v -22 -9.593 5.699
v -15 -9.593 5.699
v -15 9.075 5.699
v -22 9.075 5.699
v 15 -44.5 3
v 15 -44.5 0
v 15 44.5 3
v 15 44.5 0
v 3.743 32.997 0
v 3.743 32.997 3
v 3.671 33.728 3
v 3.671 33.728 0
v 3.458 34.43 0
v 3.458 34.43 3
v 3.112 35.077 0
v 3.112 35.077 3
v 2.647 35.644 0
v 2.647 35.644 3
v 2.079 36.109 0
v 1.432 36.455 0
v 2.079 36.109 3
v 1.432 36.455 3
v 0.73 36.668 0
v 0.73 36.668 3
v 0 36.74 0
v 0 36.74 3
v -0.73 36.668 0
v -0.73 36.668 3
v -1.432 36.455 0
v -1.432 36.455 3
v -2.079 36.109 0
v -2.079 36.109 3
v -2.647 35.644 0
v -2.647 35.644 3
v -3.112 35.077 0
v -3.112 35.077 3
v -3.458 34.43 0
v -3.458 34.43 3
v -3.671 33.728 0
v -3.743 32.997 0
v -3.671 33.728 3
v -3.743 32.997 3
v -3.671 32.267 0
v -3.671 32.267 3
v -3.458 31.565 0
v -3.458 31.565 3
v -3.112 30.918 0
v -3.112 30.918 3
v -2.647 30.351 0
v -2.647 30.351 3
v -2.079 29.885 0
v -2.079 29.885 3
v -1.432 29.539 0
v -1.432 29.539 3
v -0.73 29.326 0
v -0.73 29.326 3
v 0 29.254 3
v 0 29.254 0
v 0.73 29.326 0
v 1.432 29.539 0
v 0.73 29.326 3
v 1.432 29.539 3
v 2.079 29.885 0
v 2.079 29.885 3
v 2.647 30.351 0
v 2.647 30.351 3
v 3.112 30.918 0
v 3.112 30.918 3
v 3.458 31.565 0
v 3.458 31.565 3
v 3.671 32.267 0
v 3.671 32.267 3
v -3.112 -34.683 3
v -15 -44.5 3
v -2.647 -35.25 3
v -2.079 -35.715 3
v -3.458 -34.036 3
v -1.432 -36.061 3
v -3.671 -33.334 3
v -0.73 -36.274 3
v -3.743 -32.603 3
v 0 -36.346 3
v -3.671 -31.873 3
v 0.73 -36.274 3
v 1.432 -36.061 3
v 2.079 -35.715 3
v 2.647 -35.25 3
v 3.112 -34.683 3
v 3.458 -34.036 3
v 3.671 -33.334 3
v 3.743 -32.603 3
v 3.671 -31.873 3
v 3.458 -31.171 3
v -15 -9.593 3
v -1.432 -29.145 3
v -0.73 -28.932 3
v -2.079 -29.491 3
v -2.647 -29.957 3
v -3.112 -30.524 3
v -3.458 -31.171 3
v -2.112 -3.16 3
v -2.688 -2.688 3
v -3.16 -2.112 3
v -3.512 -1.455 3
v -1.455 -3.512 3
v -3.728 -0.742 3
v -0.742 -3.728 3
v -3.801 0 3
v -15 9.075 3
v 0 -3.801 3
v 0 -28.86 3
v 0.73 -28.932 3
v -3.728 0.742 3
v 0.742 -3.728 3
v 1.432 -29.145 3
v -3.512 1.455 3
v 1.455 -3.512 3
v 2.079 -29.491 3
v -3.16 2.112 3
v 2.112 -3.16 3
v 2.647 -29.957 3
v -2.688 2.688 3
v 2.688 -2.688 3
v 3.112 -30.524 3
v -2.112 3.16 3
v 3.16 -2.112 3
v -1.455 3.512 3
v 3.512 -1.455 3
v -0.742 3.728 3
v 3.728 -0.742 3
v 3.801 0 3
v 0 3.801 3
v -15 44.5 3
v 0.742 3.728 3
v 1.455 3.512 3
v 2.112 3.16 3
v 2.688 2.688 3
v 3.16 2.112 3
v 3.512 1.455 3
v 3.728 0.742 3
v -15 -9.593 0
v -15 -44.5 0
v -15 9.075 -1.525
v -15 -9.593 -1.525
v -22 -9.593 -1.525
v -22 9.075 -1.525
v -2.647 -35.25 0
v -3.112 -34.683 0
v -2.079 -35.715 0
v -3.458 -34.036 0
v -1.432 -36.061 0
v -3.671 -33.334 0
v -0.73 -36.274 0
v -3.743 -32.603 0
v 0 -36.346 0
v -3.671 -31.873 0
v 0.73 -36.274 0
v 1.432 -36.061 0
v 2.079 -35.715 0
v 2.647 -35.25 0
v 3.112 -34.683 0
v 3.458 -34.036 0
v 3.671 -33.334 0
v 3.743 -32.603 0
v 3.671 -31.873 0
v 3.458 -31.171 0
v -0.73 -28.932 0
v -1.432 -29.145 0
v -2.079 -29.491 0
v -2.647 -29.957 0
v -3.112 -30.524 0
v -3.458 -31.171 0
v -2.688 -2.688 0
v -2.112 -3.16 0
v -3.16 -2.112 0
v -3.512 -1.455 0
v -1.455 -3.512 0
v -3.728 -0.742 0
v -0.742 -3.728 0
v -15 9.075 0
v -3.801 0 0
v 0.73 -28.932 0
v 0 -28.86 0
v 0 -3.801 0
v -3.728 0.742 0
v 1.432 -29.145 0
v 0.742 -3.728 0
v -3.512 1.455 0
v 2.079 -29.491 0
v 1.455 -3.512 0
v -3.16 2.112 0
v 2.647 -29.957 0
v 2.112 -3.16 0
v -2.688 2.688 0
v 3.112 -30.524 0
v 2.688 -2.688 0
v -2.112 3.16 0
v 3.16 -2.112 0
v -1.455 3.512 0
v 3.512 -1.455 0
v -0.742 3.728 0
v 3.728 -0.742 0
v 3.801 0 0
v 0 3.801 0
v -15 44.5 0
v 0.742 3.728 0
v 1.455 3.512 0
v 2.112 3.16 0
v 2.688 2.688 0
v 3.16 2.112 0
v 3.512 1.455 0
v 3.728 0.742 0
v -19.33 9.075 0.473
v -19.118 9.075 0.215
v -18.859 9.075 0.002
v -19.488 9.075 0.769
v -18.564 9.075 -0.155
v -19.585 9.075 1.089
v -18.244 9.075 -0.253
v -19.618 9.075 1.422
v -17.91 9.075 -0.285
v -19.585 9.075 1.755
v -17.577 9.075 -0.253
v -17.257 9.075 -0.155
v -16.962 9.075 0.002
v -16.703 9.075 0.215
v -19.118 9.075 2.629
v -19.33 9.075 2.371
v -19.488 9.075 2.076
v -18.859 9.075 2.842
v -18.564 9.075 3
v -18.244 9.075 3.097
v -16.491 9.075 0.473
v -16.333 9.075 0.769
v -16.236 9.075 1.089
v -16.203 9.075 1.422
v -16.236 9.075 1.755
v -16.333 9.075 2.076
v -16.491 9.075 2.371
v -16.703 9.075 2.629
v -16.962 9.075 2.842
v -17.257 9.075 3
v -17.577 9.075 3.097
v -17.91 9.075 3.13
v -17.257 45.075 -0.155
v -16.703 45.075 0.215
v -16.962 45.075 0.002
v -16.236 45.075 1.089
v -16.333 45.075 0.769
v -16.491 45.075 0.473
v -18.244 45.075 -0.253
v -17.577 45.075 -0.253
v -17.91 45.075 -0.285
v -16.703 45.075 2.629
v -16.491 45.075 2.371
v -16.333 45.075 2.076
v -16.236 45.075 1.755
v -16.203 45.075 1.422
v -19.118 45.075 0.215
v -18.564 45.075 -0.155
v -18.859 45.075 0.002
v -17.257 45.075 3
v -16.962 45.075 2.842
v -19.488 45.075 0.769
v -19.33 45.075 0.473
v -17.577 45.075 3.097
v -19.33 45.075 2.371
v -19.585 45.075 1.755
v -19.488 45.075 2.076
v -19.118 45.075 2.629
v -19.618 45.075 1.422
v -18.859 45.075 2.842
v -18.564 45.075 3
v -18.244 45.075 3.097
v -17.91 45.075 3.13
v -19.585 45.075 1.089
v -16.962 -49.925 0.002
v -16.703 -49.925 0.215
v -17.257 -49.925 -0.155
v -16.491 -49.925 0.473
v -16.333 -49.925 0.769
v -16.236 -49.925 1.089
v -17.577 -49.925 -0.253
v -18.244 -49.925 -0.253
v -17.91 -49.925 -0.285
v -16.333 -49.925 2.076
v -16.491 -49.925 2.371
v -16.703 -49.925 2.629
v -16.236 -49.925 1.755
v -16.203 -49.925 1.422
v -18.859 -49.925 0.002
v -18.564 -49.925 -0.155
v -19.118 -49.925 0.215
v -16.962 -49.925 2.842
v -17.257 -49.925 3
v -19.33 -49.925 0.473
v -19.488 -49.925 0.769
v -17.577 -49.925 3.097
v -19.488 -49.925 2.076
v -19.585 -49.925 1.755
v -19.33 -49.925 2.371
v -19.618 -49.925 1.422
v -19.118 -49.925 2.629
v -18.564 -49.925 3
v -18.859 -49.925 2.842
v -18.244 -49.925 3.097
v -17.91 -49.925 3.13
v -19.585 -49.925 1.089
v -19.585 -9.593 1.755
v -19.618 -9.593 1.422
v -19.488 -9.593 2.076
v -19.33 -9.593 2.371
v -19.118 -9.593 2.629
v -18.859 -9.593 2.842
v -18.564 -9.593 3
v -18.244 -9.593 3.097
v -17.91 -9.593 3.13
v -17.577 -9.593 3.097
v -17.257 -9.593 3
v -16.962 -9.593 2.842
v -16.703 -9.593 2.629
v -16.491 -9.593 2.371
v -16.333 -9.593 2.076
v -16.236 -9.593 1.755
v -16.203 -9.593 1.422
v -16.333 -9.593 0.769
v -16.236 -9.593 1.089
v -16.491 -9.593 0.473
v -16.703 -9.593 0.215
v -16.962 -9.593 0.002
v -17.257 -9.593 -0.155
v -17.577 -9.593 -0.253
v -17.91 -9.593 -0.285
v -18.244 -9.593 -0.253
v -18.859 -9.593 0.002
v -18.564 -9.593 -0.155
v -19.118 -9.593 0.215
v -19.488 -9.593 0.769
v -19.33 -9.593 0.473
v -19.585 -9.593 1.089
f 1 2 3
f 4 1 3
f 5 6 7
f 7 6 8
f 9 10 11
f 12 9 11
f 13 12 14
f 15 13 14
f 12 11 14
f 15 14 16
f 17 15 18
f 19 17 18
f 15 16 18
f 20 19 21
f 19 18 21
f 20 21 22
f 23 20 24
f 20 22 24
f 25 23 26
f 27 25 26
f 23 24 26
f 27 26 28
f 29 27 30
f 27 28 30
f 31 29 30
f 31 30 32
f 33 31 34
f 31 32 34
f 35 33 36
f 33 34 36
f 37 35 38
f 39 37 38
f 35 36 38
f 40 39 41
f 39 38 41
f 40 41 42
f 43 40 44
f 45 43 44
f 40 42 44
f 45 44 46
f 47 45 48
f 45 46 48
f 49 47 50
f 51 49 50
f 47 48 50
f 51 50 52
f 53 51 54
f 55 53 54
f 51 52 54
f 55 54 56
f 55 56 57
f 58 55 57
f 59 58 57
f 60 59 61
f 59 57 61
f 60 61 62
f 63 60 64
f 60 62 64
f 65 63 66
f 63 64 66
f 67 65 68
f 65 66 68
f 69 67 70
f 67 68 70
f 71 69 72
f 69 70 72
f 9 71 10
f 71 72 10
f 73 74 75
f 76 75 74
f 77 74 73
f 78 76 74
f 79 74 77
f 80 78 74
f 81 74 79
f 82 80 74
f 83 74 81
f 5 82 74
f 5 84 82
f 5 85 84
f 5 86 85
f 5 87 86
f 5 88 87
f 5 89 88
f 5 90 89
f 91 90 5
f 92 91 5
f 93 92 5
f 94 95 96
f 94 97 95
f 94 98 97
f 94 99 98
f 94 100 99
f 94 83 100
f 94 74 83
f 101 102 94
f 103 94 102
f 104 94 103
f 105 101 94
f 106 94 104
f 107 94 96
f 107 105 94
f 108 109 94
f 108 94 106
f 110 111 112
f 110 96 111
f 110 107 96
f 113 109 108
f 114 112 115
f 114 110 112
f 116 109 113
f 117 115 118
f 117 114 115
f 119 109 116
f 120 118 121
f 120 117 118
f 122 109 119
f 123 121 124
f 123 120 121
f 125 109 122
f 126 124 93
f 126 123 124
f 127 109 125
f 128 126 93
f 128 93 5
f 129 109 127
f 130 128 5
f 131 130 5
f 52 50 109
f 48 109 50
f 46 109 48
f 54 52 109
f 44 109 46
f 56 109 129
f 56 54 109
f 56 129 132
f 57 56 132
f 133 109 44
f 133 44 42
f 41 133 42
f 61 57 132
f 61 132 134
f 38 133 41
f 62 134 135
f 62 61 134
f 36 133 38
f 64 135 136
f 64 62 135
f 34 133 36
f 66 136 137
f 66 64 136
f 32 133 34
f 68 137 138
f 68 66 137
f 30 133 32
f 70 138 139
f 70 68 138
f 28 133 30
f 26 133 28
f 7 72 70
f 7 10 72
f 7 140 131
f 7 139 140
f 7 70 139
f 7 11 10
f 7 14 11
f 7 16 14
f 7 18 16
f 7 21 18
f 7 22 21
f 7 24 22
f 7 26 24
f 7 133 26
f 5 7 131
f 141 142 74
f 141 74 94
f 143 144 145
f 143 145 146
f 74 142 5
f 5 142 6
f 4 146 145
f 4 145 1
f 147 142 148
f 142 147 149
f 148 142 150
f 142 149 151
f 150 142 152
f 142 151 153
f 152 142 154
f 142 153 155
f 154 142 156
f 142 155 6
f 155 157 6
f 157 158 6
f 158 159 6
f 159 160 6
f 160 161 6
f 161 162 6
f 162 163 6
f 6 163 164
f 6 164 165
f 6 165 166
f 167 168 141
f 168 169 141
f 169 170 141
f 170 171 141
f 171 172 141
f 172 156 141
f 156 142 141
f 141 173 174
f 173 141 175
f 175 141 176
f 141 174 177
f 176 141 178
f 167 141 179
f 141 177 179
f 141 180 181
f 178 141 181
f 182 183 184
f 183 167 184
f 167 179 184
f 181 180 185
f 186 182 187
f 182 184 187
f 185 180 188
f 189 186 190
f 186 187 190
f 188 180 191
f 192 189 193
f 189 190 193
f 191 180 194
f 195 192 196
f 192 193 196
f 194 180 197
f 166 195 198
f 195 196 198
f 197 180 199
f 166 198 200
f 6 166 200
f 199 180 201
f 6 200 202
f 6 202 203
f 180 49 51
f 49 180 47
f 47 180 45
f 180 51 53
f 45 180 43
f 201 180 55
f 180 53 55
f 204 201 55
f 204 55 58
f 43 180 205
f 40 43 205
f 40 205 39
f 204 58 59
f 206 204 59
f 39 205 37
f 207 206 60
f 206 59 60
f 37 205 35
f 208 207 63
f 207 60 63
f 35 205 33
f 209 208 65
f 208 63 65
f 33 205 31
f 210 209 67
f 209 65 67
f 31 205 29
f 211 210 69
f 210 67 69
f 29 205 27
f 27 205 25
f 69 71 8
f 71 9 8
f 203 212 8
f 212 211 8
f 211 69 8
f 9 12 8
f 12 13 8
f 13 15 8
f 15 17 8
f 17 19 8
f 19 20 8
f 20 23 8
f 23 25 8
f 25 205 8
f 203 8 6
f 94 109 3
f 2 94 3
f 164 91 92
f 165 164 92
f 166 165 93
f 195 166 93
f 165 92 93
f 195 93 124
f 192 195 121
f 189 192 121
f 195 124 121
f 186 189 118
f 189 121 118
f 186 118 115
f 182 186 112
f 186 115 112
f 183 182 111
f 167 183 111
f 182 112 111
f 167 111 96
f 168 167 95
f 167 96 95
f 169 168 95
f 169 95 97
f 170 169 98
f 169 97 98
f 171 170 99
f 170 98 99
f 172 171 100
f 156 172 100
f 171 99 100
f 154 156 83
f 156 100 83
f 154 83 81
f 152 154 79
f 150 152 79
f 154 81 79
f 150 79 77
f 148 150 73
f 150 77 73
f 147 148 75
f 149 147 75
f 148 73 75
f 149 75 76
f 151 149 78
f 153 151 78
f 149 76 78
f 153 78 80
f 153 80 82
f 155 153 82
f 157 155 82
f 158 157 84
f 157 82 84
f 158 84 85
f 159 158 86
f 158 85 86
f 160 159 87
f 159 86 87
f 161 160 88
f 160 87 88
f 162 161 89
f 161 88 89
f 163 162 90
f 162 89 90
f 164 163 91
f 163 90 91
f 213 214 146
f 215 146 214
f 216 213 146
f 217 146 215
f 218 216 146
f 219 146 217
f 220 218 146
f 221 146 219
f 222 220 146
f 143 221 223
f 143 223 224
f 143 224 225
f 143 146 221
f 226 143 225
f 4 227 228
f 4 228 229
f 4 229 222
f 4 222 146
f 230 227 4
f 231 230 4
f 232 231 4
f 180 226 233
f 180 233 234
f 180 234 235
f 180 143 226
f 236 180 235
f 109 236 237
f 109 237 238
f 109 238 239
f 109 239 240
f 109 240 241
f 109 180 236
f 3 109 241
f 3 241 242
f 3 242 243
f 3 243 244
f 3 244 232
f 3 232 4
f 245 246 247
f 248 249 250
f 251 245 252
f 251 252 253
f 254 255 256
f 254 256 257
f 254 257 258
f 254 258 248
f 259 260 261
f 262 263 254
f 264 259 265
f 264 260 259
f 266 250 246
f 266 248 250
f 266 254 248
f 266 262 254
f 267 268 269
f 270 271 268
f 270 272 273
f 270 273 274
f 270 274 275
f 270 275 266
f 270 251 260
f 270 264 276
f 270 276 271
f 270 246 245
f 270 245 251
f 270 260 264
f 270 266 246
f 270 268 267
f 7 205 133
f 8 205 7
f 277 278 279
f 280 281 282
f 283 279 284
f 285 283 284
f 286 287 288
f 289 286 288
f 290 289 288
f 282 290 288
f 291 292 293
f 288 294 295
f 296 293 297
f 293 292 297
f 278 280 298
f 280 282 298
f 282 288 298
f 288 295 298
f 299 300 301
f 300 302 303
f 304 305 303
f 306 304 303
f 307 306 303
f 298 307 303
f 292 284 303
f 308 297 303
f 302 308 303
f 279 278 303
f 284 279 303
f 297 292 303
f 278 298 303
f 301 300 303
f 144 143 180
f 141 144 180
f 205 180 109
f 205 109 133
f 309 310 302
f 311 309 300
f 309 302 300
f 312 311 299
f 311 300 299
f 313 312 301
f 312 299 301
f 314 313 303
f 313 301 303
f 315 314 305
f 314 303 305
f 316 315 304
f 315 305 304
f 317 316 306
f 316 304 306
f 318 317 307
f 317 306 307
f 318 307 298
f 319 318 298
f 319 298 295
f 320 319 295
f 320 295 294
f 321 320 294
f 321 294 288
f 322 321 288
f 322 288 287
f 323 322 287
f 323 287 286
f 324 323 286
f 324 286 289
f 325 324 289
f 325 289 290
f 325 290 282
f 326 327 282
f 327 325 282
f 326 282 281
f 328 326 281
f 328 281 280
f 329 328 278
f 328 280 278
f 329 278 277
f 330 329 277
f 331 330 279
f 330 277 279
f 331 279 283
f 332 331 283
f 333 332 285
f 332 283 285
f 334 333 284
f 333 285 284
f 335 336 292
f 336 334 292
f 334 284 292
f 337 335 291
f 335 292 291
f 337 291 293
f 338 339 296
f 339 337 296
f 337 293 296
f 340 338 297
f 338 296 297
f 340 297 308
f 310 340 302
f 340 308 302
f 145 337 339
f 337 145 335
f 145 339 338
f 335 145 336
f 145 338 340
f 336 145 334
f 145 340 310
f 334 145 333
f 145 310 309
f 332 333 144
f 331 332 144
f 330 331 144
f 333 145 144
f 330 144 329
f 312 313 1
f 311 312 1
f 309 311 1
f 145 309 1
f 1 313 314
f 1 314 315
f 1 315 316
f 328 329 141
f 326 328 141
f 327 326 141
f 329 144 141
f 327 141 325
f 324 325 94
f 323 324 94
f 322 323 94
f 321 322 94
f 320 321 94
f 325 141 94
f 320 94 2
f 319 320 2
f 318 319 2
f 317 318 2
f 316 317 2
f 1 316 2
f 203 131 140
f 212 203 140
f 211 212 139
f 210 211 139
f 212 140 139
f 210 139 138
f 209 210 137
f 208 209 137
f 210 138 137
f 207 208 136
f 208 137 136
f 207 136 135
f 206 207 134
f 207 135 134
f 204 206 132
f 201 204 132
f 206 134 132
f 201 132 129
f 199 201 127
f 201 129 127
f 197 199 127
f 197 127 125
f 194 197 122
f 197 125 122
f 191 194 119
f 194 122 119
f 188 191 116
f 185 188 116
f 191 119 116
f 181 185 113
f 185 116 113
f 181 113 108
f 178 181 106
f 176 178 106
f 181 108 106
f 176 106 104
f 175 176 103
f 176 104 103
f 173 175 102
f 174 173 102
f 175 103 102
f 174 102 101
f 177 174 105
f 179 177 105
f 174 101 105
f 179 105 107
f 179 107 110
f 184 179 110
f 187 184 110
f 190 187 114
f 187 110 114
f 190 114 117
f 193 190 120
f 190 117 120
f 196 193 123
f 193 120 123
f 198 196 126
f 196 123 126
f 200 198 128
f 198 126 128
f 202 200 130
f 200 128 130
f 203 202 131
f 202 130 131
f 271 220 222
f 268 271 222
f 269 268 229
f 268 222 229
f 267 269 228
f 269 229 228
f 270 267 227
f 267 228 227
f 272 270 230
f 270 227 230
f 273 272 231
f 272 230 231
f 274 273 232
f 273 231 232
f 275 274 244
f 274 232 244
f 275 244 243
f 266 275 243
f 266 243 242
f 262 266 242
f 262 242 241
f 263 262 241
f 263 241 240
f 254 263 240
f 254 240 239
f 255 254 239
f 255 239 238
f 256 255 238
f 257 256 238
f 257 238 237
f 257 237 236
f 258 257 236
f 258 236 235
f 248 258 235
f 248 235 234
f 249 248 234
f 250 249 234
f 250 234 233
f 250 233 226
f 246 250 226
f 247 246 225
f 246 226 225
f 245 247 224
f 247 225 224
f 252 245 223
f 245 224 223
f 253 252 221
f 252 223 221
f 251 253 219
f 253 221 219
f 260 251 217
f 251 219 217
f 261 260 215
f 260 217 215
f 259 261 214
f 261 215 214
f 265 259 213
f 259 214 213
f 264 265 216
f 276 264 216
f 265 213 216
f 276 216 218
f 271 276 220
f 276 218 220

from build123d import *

# Parameters (mm, degrees)
CROQUIS1_W                   = 30
CROQUIS1_H                   = 89
SALIENTE_EXTRUIR1_DEPTH      = 3
CROQUIS2_R                   = 3.800850318
CROQUIS2_R_2                 = 3.742975761
CORTAR_EXTRUIR1_DEPTH        = 3
CROQUIS3_W                   = 7.223510215
CROQUIS3_H                   = 18.667669577
SALIENTE_EXTRUIR2_DEPTH      = 7
SALIENTE_EXTRUIR3_DEPTH      = 36
SALIENTE_EXTRUIR3_DEPTH_BACK = 59
CROQUIS4_R                   = 1.707521399


with BuildPart() as part:
    # Croquis1 → Saliente-Extruir1 (new body)
    with BuildSketch(Plane.XY):
        Rectangle(CROQUIS1_W, CROQUIS1_H)
    extrude(amount=SALIENTE_EXTRUIR1_DEPTH)

    # Croquis2 → Cortar-Extruir1 (cut)
    with BuildSketch(Plane.XY.offset(3)):
        Circle(CROQUIS2_R)
        with Locations((0, 32.997286313)):
            Circle(CROQUIS2_R_2)
        with Locations((0, -32.603288865)):
            Circle(CROQUIS2_R_2)
    extrude(amount=-CORTAR_EXTRUIR1_DEPTH, mode=Mode.SUBTRACT)

    # Croquis3 → Saliente-Extruir2 (add)
    with BuildSketch(Plane.ZY.offset(15)):
        with Locations((2.087224579, -0.259009368)):
            Rectangle(CROQUIS3_W, CROQUIS3_H)
    extrude(amount=SALIENTE_EXTRUIR2_DEPTH)

    # Croquis4 → Saliente-Extruir3 (add, two sides: drawn at the far end of the back side and taken through both)
    with BuildSketch(Plane(origin=(0, 9.074825421, 0), x_dir=(1, 0, 0), z_dir=(0, 1, 0)).offset(-SALIENTE_EXTRUIR3_DEPTH_BACK)):
        with Locations(Location((-17.910478142, -1.422079338, 0), (0, 0, 180))):
            Circle(CROQUIS4_R)
    extrude(amount=SALIENTE_EXTRUIR3_DEPTH + SALIENTE_EXTRUIR3_DEPTH_BACK)


solid = part.part
